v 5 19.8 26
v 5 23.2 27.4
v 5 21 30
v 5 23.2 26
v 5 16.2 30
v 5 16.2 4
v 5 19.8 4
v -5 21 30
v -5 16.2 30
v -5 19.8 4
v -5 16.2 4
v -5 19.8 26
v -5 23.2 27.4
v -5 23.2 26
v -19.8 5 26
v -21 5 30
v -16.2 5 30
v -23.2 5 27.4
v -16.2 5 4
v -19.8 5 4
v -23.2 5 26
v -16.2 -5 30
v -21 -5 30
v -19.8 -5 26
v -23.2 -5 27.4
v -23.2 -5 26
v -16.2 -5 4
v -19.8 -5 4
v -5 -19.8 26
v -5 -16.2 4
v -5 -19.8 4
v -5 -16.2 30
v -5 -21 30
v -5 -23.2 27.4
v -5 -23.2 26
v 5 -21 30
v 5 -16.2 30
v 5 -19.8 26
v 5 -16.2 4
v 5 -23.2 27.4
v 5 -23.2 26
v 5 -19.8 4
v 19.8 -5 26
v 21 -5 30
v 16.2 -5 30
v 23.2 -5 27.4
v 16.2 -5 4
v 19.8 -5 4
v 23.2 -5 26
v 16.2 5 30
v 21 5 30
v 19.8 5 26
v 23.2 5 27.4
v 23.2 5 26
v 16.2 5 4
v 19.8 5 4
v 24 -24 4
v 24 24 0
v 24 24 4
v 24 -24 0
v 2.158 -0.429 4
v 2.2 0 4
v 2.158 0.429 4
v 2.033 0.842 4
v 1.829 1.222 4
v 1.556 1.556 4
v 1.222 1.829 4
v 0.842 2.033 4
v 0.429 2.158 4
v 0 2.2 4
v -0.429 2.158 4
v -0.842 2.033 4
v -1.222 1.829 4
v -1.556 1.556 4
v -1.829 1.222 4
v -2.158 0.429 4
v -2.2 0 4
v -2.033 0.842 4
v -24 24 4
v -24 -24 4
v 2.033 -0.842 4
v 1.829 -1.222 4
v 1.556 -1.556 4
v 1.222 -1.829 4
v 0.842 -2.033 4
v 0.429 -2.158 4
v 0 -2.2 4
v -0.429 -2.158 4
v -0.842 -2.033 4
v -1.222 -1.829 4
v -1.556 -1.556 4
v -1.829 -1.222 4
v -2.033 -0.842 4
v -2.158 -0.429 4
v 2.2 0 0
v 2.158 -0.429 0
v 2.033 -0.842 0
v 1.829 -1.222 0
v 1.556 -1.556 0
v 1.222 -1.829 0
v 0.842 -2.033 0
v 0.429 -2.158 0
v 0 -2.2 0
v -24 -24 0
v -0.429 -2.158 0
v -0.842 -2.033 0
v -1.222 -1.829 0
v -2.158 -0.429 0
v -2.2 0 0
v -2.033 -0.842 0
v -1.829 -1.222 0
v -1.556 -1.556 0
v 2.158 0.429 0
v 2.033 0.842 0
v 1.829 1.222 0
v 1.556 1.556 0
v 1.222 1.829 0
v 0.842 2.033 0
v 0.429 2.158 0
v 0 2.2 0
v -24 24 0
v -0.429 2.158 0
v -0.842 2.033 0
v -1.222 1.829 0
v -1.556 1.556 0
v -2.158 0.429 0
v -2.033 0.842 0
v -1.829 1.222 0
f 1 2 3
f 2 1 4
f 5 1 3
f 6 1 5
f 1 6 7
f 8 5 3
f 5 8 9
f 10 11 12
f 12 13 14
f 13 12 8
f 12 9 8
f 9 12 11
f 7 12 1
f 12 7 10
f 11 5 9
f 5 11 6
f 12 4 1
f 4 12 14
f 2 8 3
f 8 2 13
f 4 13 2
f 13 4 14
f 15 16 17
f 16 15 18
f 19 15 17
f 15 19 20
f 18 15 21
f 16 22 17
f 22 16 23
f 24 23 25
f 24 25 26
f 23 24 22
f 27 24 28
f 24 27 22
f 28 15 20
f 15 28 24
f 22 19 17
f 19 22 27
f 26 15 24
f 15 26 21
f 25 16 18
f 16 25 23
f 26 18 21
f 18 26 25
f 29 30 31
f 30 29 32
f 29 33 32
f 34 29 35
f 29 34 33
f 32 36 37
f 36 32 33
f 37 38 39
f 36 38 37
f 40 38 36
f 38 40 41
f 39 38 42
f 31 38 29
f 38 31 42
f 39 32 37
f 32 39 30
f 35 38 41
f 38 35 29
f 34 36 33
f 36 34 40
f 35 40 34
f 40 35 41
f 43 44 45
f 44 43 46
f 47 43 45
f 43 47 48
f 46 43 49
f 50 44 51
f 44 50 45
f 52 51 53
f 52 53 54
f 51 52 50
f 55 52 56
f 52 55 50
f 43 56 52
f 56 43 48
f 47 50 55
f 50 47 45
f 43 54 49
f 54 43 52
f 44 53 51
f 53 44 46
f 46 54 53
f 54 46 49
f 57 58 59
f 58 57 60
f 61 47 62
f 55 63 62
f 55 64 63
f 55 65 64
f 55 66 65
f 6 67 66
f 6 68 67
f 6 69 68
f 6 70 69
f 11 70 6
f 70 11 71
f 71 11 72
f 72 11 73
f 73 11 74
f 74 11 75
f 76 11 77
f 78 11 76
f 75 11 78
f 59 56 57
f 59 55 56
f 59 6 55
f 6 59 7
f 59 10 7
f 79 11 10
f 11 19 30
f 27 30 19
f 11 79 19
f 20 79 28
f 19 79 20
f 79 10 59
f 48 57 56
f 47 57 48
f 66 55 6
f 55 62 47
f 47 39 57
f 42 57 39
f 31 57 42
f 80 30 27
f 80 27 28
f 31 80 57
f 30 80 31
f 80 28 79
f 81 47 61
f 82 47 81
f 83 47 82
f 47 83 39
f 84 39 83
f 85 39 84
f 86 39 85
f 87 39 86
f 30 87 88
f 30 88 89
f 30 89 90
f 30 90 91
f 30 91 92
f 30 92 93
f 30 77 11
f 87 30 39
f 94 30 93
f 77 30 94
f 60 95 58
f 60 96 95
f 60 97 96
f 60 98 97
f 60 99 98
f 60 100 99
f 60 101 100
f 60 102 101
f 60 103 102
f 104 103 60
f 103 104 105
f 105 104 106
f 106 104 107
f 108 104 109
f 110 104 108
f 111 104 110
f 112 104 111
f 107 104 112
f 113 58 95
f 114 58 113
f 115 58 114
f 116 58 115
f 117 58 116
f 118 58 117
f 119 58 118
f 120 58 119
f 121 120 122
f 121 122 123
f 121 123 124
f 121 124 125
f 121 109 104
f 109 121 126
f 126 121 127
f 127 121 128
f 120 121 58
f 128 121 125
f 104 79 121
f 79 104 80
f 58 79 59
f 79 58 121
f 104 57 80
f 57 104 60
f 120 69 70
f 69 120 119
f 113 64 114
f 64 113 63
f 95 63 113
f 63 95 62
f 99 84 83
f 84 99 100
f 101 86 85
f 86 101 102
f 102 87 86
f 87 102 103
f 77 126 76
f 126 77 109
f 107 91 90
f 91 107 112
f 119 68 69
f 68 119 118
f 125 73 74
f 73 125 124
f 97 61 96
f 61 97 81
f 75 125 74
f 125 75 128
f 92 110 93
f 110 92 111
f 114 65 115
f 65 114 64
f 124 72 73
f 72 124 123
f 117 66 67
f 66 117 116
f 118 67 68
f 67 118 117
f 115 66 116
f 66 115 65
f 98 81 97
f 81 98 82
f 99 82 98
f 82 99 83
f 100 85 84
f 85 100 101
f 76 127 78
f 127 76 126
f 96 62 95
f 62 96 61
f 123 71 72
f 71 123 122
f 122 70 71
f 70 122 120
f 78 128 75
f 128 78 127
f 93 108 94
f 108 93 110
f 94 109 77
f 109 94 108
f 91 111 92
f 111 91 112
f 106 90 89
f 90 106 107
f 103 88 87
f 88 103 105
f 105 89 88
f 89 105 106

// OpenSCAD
$fn = 32;

// ----------------------------------------------------------------------
// Snap-fit latch: 4 arms, 26 mm tall, 3.6 mm undercut hooks
// ----------------------------------------------------------------------

// --- parameters (mm) ---
base_d = 48;              // base plate depth
base_h = 4;               // base plate thickness
span = 36;                // distance between opposite arms
arm_t = 3.6;              // arm thickness
arm_d = 10;               // arm width
height = 26;              // free arm length
head_len = 3.6;           // hook reach
head_h = 4;               // hook height
lead = 1.4;               // lead-in ramp thickness
bore_d = 4.4;             // base fixing bore
top_z = 30;               // height of the arm tips above the base

arms = 4;

difference() {
  union() {
    /* base plate, centred on the arm ring */
    translate([-24, -24, 0]) cube([base_d, base_d, base_h]);
    for (a = [0 : 360 / arms : 359]) rotate([0, 0, a]) {
    /* arm, sunk 0.5 mm into the base */
    translate([-arm_d / 2, span / 2 - arm_t / 2, base_h - 0.5]) cube([arm_d, arm_t, height + 0.5]);
    /* hook: a convex hull of a tall inner block and a thin outer lip
       gives a flat undercut below and a lead-in ramp on top */
    hull() {
      translate([-arm_d / 2, span / 2 + arm_t / 2 - 0.6, top_z - head_h]) cube([arm_d, lead + 0.4, head_h]);
      translate([-arm_d / 2, span / 2 + arm_t / 2 - 0.2, top_z - head_h]) cube([arm_d, head_len, lead]);
    }
    }
  }
  translate([0, 0, -2.5]) cylinder(h = base_h + 5, d = bore_d);
}
